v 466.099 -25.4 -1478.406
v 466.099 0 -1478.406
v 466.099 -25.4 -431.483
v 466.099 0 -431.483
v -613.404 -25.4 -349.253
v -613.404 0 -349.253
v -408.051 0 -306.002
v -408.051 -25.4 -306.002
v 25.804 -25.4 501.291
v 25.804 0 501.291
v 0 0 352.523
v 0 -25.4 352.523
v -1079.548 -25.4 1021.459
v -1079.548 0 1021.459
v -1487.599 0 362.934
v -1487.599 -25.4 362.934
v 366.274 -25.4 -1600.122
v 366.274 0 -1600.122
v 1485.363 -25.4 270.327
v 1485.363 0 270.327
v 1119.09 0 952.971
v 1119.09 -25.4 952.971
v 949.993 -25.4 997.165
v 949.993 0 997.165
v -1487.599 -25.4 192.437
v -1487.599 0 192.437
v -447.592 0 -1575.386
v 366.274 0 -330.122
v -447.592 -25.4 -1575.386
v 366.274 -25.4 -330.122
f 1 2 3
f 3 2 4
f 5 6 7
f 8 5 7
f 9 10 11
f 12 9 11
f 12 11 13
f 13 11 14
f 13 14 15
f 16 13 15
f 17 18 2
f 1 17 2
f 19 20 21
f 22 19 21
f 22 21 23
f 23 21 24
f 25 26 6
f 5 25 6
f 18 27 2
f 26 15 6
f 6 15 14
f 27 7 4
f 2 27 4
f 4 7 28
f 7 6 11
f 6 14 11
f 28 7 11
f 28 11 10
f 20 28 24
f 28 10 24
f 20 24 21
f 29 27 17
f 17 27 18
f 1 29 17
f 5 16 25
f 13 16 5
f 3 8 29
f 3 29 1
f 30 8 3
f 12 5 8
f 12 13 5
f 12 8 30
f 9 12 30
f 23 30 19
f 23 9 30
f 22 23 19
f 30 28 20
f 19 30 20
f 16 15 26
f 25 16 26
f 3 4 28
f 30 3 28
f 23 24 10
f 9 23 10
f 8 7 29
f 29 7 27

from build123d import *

# Parameters (mm, degrees)
F1_DEPTH = 25.4


with BuildPart() as f1:
    # F0 (on Front) → F1 (new body)
    with BuildSketch(Plane.XZ):
        Polygon((366.2736102042, -330.1217082712), (0, 352.5229521987), (-408.0508126226, -306.0016292089), align=None)
        Polygon((1119.0896073276, 952.971493517), (0, 352.5229521987), (366.2736102042, -330.1217082712), (1485.3632175318, 270.3268330471), align=None)
        Polygon((25.8036721498, 501.290678978), (0, 352.5229521987), (1119.0896073276, 952.971493517), (949.9932185284, 997.1654162565), align=None)
        Polygon((-408.0508126226, -306.0016292089), (0, 352.5229521987), (-1079.5484941108, 1021.4587105964), (-1487.5993067334, 362.9341291888), align=None)
        Polygon((-613.4037528071, -349.2533289781), (-408.0508126226, -306.0016292089), (-1487.5993067334, 362.9341291888), (-1487.5993067334, 192.43671), align=None)
        Polygon((366.2736102042, -330.1217082712), (-408.0508126226, -306.0016292089), (-447.5919258394, -1575.385928925), (366.2736102042, -1600.1217082712), align=None)
        Polygon((466.0987257957, -431.4825236797), (366.2736102042, -330.1217082712), (366.2736102042, -1600.1217082712), (466.0987257957, -1478.4063100815), align=None)
    extrude(amount=F1_DEPTH)


solid = f1.part
